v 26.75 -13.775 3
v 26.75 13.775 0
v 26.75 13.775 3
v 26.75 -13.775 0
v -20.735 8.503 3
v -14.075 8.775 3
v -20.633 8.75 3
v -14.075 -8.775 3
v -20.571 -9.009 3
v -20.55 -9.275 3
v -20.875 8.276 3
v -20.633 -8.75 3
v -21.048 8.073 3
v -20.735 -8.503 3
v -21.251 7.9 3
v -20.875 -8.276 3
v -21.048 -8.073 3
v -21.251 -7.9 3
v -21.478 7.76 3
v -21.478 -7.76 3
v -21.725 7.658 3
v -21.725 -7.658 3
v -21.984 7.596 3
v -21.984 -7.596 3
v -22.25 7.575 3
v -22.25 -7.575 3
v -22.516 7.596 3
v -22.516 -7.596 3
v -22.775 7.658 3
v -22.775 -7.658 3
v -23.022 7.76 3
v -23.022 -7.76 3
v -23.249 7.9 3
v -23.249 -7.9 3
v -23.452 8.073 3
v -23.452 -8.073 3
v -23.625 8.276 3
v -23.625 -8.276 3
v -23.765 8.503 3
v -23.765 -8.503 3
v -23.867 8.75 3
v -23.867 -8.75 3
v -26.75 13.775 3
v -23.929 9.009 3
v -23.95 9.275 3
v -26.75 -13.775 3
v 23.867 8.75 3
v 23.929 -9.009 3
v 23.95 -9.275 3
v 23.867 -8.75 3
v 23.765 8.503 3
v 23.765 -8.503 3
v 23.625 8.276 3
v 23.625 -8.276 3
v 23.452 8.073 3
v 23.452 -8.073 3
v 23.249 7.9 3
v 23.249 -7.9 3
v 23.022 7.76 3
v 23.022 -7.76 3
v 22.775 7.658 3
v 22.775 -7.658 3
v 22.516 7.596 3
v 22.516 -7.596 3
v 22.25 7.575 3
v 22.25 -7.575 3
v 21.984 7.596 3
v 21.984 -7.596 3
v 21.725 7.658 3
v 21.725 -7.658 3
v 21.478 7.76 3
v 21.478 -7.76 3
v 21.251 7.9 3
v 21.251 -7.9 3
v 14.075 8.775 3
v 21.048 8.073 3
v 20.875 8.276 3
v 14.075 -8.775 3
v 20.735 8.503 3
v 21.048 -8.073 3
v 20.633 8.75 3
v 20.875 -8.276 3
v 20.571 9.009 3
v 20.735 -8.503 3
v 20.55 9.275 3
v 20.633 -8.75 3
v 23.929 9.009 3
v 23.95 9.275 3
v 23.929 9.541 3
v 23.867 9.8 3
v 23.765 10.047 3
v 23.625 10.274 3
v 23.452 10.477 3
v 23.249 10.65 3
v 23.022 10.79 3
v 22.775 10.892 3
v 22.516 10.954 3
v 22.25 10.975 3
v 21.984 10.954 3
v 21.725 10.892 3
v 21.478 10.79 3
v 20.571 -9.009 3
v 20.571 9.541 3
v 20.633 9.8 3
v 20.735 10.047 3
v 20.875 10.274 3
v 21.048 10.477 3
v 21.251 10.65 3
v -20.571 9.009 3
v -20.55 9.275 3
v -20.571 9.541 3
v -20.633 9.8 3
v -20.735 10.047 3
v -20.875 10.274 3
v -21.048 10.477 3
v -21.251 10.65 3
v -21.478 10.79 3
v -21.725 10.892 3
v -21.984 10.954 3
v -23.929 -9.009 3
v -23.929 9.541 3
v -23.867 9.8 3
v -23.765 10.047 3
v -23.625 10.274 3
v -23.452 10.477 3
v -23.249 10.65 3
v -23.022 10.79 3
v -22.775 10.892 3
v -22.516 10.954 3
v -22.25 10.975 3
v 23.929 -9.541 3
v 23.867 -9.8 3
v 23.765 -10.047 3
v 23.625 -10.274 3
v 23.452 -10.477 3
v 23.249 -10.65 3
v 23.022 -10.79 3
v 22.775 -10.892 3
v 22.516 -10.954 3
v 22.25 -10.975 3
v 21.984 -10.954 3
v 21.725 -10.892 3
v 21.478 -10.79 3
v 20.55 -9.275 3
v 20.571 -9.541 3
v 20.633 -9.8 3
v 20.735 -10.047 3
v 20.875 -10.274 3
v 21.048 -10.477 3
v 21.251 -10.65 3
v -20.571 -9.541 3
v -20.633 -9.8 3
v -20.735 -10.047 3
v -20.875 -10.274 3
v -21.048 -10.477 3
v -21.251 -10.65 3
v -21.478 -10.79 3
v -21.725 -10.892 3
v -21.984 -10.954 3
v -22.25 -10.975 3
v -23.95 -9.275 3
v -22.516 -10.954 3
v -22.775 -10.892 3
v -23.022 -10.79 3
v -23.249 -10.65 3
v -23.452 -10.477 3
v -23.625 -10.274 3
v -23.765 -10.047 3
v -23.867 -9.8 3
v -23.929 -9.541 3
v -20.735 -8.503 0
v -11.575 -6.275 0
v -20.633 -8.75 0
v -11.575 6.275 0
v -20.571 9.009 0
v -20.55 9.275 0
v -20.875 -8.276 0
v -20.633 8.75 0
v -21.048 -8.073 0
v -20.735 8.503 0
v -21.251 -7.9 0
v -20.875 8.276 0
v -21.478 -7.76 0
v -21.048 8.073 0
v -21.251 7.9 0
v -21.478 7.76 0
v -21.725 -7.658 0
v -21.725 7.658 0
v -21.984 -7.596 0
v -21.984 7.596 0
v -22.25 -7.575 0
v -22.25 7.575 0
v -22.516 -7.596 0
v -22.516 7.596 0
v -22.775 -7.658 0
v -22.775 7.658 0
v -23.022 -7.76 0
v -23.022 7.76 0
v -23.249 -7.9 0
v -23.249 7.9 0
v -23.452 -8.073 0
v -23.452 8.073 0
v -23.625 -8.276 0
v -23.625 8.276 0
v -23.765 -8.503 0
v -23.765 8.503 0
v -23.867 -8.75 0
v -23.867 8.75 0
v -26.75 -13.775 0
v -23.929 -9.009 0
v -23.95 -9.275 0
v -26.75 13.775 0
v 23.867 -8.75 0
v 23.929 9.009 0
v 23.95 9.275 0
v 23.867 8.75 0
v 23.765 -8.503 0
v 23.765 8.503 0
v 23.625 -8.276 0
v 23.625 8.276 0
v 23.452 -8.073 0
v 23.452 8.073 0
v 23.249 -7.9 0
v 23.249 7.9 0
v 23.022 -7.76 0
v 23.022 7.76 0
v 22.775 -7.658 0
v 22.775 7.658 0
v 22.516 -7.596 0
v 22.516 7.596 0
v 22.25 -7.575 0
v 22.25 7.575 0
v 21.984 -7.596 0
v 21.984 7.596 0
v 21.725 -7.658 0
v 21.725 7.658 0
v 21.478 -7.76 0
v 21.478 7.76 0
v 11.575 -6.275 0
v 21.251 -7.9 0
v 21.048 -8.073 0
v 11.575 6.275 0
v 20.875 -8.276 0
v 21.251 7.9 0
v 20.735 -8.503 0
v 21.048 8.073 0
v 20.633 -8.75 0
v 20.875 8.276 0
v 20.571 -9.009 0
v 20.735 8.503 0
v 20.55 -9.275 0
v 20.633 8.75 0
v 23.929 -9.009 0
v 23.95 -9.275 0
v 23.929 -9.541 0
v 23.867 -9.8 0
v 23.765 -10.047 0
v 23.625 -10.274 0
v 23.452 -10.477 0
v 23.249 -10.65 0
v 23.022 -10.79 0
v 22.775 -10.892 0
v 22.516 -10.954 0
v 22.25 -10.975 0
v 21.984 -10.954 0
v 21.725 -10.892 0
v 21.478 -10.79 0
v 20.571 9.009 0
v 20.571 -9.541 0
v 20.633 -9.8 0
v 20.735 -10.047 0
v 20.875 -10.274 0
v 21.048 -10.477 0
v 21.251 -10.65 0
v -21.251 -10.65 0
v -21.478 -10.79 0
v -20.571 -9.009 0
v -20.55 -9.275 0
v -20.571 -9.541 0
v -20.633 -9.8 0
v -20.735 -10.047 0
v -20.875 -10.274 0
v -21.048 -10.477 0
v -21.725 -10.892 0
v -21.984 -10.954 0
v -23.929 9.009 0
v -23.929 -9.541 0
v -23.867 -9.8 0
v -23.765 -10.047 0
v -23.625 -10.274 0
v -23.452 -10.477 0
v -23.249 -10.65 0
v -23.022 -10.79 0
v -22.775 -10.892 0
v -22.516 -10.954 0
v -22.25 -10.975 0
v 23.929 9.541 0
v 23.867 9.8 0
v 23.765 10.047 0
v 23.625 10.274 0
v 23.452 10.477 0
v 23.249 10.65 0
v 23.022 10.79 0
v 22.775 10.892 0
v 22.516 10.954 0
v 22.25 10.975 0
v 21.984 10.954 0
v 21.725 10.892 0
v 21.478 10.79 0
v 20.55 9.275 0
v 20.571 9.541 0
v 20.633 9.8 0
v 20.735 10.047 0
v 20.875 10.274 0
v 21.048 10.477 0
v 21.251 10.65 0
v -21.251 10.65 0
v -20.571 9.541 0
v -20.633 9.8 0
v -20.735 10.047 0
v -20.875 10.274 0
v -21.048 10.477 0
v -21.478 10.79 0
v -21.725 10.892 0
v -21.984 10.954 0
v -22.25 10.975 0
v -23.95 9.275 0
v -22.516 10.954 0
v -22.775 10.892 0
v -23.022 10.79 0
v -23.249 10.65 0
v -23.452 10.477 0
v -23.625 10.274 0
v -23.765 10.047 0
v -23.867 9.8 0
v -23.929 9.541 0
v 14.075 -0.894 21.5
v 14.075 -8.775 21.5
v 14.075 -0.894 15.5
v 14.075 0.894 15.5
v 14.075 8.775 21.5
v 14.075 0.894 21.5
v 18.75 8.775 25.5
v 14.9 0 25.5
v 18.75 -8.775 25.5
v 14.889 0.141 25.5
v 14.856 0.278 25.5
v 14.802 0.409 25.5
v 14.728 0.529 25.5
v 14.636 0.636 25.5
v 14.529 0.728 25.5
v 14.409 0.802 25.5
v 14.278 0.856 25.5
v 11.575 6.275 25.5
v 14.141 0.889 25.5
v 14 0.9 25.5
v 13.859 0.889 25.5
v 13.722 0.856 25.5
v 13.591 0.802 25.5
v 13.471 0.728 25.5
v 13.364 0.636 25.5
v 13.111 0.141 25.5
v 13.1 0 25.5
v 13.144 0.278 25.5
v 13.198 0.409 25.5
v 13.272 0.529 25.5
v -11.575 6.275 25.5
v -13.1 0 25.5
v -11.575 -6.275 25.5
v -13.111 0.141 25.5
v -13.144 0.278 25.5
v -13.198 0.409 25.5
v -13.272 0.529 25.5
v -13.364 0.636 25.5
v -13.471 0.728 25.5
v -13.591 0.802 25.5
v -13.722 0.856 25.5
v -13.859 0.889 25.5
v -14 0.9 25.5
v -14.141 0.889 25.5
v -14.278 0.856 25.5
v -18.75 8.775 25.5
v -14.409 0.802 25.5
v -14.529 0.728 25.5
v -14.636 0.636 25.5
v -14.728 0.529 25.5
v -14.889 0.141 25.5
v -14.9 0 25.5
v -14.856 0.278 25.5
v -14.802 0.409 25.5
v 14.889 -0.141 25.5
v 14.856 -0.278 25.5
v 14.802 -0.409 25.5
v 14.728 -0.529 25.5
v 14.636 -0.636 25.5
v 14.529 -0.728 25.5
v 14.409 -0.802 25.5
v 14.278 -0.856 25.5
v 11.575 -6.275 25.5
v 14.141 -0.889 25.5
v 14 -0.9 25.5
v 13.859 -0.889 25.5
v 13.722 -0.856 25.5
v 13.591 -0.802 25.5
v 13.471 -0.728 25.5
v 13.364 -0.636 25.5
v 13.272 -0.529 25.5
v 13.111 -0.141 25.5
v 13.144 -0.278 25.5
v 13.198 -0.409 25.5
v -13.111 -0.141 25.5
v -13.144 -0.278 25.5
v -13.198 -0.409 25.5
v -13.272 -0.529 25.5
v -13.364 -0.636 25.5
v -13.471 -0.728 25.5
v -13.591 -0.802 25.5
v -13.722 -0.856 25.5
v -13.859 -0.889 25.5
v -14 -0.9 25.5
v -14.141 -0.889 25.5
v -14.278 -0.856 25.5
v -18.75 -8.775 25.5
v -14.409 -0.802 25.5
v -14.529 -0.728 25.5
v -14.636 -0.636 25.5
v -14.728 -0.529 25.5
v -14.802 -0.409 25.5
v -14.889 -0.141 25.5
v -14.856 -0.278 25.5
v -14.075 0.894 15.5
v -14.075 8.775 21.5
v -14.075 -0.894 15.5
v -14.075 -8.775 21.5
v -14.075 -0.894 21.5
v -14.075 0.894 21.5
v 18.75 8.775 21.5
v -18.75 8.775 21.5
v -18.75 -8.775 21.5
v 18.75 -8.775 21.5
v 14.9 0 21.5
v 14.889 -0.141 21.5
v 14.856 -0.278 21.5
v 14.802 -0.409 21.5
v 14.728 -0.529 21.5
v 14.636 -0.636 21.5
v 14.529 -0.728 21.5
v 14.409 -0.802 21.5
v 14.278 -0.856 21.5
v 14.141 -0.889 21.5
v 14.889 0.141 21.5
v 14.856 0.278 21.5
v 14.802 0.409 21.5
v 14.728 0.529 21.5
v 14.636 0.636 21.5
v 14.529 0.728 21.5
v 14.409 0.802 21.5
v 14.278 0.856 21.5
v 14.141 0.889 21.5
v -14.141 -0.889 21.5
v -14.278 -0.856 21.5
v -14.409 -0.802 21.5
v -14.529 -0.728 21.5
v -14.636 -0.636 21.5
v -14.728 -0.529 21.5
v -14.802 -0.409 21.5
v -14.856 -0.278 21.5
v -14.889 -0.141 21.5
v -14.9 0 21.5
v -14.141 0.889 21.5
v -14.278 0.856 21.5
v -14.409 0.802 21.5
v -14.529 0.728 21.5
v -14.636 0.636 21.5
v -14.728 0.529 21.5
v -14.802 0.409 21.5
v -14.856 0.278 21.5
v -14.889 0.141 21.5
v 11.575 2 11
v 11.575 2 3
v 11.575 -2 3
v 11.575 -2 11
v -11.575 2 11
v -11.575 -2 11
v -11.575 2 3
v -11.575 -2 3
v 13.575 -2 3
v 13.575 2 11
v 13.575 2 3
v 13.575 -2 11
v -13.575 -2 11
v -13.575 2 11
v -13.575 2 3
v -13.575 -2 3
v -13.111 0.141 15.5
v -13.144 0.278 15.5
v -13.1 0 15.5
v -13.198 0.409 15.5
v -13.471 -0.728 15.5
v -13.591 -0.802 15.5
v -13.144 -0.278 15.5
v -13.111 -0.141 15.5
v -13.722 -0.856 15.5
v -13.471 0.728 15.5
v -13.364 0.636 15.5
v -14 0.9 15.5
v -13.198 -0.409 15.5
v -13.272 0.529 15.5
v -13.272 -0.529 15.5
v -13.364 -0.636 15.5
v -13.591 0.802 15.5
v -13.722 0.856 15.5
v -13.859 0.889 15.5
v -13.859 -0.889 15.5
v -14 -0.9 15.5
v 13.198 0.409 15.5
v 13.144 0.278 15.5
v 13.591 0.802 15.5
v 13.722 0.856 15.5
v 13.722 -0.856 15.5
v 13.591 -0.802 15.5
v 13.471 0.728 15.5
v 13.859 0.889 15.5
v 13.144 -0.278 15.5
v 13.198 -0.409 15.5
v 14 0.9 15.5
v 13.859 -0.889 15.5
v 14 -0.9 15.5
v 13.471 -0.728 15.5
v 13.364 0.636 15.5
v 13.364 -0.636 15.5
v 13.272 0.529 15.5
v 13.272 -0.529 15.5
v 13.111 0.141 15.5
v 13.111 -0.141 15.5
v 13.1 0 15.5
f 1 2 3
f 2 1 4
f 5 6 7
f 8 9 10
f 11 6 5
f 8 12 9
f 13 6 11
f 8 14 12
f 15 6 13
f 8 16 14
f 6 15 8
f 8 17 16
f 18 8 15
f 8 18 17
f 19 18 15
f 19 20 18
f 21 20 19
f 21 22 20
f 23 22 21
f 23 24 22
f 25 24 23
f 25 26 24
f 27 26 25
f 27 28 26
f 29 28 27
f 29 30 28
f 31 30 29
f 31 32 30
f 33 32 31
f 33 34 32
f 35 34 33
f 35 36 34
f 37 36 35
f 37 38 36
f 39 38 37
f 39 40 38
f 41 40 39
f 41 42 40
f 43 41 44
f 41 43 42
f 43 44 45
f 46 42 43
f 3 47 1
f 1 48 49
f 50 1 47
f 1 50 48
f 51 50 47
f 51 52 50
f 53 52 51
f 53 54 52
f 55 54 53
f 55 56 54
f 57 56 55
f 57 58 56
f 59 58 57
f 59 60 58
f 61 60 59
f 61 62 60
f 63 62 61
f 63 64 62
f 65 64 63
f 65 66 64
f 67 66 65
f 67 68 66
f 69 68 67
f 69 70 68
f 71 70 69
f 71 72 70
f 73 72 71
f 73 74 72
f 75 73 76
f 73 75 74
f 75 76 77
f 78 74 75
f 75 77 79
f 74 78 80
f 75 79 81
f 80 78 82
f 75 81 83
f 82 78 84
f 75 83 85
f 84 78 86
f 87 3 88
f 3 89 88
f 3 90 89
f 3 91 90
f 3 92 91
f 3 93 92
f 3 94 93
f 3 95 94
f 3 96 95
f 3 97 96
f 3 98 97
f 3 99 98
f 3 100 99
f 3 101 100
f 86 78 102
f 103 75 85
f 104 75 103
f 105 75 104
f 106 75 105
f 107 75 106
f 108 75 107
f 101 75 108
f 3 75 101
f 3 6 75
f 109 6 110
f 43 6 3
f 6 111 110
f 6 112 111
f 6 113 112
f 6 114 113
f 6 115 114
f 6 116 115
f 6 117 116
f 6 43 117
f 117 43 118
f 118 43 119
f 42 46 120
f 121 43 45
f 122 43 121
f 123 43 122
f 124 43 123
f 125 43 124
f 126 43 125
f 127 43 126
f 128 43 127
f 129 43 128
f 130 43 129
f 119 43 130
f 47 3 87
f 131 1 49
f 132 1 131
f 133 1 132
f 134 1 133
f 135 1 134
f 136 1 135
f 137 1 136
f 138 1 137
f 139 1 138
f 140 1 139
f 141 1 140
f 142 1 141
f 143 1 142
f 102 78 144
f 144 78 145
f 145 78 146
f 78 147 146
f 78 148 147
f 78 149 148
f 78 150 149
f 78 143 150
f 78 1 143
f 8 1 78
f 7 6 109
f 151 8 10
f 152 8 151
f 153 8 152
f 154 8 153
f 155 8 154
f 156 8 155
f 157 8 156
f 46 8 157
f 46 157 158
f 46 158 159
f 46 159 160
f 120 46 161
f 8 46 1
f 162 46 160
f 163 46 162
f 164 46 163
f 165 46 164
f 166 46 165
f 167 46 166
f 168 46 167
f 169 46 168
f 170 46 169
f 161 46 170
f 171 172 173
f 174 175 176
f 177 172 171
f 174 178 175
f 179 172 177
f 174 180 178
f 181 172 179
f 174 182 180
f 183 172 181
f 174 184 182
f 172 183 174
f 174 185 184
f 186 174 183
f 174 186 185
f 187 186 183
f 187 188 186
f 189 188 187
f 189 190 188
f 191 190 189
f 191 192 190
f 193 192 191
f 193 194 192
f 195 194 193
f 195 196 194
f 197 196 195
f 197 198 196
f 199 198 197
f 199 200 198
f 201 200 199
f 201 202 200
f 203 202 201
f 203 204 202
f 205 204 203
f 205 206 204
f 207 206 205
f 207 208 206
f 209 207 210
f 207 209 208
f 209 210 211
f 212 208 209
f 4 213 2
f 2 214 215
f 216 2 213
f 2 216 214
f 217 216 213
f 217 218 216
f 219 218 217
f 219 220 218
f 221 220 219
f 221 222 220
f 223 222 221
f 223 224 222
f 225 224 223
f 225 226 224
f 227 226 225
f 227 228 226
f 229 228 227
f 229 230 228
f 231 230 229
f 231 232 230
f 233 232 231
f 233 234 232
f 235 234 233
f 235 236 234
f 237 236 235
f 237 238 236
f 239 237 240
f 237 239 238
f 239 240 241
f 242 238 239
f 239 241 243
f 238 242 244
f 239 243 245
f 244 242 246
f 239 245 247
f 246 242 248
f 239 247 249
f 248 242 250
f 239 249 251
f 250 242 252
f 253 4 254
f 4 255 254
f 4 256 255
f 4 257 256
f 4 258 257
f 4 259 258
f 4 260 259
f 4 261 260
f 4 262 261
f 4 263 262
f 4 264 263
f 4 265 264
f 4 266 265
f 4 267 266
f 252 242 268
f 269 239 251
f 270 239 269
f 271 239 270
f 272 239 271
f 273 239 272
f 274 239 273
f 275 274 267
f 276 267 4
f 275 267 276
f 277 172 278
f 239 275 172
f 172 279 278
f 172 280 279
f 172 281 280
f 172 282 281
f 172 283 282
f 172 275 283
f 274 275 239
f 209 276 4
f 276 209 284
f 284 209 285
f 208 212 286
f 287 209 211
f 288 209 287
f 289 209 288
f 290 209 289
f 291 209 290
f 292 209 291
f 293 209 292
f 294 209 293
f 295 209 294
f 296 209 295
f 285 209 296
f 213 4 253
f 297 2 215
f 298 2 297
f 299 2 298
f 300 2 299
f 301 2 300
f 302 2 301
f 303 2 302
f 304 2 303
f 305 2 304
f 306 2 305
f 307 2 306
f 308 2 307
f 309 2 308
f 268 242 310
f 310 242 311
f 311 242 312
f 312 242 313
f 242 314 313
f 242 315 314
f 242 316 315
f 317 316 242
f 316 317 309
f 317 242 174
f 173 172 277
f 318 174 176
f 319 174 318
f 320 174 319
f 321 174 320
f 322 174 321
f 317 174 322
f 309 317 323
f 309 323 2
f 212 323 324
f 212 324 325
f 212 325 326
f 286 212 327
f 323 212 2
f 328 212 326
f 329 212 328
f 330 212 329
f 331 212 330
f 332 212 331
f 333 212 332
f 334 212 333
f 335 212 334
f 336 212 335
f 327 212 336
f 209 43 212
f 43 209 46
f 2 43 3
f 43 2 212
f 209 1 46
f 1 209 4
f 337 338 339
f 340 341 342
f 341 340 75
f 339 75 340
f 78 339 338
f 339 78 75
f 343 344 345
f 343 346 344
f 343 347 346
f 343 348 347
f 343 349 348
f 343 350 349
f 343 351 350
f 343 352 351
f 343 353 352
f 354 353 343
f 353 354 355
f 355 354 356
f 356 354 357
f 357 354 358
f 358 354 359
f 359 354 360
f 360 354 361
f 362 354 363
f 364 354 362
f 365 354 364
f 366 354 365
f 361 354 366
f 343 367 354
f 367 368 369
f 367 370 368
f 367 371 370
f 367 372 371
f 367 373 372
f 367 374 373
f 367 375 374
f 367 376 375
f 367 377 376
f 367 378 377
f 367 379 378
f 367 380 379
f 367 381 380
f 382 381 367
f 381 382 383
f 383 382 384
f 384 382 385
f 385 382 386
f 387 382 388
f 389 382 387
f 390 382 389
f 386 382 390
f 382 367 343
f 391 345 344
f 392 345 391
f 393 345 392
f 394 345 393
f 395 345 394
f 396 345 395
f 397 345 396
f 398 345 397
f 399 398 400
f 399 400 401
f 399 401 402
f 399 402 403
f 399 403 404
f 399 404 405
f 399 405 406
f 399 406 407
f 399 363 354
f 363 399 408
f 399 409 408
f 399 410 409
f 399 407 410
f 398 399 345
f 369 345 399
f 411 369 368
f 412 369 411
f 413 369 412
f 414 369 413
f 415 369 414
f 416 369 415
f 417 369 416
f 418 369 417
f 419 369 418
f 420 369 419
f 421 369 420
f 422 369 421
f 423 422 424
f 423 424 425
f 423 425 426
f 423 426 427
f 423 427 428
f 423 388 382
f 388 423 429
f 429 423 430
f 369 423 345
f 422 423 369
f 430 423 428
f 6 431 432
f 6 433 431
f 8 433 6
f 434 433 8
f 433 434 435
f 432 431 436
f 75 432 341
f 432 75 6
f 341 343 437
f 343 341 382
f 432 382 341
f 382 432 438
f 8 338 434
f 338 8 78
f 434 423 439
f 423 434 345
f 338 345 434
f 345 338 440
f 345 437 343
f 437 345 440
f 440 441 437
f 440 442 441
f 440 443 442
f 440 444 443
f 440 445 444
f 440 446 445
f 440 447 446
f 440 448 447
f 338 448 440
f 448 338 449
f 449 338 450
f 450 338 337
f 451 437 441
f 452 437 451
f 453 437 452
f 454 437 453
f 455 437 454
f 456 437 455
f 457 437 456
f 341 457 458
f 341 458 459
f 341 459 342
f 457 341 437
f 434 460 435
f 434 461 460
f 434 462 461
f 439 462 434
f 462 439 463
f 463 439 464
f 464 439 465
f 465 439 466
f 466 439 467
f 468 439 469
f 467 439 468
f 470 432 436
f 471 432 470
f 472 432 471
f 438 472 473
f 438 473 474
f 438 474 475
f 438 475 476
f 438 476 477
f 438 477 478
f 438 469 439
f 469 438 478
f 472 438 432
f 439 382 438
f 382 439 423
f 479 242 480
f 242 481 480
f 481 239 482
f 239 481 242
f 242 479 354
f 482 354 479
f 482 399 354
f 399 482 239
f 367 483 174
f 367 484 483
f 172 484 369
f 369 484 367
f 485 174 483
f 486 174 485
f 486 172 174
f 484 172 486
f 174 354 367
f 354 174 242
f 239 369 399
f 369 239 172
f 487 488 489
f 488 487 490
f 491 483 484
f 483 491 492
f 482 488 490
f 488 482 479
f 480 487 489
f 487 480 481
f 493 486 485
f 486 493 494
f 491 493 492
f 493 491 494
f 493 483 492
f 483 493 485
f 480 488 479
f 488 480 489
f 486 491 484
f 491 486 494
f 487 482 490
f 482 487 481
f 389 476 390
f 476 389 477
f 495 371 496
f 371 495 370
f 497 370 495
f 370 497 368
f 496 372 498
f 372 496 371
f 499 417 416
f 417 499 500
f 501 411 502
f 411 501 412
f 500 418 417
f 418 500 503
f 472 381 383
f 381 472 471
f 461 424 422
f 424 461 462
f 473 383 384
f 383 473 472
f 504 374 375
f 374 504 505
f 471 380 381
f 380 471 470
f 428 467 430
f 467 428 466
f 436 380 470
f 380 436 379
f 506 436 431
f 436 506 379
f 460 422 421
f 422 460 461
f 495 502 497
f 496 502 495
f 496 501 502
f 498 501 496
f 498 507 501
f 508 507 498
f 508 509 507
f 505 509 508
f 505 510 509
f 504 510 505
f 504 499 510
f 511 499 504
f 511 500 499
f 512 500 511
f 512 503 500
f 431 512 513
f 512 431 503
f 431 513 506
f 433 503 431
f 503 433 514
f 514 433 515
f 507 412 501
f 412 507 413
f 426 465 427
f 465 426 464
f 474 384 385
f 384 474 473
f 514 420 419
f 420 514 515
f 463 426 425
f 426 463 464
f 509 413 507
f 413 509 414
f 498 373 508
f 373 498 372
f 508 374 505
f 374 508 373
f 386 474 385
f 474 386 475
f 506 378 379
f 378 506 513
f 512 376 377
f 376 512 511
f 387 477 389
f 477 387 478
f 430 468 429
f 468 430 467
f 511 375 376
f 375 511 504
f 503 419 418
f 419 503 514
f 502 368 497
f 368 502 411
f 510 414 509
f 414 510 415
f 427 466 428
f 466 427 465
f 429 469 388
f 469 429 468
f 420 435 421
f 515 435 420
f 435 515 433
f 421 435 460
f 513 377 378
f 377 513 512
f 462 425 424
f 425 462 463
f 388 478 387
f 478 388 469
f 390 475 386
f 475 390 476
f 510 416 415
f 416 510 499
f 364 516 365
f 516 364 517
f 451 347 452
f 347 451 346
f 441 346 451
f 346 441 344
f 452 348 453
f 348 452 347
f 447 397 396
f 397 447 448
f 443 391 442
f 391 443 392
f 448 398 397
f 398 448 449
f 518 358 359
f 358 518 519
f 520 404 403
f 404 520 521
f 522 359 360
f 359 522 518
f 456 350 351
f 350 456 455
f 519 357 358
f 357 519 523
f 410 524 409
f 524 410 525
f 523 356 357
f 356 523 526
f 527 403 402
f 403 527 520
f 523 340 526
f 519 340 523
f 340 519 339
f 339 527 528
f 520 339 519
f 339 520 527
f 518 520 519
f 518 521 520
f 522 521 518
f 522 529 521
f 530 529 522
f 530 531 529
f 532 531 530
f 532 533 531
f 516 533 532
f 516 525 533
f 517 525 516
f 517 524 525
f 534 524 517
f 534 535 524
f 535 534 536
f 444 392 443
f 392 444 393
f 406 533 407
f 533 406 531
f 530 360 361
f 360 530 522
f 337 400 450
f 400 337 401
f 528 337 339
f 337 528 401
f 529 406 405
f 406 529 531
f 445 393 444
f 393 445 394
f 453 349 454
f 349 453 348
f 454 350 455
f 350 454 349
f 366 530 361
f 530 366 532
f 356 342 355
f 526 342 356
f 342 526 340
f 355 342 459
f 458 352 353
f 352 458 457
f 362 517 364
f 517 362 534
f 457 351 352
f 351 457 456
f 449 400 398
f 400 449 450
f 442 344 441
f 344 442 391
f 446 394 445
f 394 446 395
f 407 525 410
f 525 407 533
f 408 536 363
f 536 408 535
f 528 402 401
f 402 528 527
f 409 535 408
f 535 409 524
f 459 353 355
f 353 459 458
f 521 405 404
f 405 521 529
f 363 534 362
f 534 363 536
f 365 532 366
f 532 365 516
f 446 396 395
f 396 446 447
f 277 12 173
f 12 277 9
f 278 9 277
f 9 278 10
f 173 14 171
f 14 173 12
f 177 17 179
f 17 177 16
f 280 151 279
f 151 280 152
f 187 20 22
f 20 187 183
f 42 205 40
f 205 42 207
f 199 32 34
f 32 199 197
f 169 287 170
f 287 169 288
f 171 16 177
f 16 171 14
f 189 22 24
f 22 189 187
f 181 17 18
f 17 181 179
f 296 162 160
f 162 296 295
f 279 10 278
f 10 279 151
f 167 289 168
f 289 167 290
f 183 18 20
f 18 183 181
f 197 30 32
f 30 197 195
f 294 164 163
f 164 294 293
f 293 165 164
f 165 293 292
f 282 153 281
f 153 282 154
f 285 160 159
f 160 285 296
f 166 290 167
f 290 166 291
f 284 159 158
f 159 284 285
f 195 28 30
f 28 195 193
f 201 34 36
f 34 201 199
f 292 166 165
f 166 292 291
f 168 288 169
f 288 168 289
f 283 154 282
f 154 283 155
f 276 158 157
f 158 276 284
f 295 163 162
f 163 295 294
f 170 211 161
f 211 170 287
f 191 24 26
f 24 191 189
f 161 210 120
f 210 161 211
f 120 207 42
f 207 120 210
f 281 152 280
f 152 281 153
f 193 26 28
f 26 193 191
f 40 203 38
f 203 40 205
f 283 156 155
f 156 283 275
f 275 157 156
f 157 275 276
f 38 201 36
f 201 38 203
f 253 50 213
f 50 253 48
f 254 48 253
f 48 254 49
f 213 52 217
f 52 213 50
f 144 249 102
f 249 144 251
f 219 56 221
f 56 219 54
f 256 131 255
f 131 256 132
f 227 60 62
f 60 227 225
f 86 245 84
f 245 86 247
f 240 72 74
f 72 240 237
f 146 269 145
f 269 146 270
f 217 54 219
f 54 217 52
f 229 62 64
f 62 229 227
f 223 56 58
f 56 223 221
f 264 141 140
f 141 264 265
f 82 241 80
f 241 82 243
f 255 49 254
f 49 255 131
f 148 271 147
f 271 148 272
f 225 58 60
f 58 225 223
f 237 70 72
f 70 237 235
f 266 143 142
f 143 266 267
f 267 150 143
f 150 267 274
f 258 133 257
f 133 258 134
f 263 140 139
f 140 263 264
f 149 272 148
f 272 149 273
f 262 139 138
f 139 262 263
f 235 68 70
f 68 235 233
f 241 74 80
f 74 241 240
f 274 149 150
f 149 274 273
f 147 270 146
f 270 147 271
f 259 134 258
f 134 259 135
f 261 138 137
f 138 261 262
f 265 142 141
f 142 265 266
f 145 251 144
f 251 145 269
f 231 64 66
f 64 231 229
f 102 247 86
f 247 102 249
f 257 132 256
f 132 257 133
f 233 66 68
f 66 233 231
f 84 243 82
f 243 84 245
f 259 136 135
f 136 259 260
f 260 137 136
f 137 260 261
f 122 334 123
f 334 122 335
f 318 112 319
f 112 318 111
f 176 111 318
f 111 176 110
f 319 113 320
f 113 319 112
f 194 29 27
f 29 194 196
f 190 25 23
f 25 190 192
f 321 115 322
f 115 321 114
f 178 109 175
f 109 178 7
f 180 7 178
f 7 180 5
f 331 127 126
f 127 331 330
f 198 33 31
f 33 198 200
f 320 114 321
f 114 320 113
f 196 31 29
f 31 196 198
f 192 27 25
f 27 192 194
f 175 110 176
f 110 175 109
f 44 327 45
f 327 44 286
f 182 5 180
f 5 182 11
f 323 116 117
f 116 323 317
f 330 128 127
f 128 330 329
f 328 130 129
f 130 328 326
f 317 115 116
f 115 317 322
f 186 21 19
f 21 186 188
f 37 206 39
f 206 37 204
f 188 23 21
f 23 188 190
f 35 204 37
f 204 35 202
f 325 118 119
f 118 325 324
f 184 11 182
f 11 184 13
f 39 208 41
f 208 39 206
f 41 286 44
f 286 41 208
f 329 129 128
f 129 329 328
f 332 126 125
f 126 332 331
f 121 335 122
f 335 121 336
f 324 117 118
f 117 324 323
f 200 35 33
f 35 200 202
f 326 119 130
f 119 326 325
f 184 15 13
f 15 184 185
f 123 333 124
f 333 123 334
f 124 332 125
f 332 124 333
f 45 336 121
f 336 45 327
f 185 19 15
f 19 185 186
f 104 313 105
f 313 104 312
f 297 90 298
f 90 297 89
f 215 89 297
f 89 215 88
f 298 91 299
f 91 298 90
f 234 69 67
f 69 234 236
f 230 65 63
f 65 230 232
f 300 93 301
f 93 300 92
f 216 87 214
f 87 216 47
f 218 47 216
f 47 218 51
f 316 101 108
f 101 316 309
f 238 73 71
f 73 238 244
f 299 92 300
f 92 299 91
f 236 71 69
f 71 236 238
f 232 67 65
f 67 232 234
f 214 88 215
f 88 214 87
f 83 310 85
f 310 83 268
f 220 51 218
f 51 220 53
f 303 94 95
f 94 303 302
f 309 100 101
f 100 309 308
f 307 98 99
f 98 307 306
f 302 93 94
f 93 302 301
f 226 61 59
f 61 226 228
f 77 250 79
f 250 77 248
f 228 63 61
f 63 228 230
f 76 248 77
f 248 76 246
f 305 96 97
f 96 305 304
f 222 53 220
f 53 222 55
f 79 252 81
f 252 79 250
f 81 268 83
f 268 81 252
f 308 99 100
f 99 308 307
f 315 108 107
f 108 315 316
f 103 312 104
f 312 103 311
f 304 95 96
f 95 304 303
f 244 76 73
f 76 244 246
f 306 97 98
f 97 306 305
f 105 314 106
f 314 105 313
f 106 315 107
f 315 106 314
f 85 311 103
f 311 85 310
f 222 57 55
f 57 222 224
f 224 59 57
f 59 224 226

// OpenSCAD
// file: params.scad
// params.scad — Parametros globales para el montaje de actuadores MASK-7
// Compatible con OpenSCAD 2021+

$fn = 40; // Calidad de curvas circulares

// --- Tolerancia general para impresion FDM ---
tol = 0.35; // Holgura lateral para ajuste deslizante firme

// --- Micro-servo standard tipo MG90S / SG90 ---
servo_length = 22.8 + tol;       // Largo del cuerpo principal (mm)
servo_width  = 12.2 + tol;       // Ancho del cuerpo principal (mm)
servo_height = 22.5;             // Altura del cuerpo hasta las orejas de montaje (mm)
servo_total_height = 28.5;       // Altura total incluyendo cabezal del eje (mm)

servo_flange_length = 32.5;      // Largo total con orejas de fijacion (mm)
servo_flange_thickness = 2.5;    // Espesor de las orejas del servo (mm)
servo_hole_dist = 28.0;          // Distancia entre centros de tornillos de fijacion (mm)

// --- Tornilleria ---
screw_m2_dia = 2.0;              // Diametro nominal tornillo M2 (mm)
screw_m2_hole = 2.4;             // Agujero de paso M2 con holgura (mm)
screw_m2_tap  = 1.8;             // Agujero para autorroscar M2 en plastico (mm)

screw_m3_dia = 3.0;              // Diametro nominal tornillo M3 (mm)
screw_m3_hole = 3.4;             // Agujero de paso M3 con holgura (mm)
screw_m3_tap  = 2.8;             // Agujero autorroscante M3 (mm)

// --- Espesores estructurales de soportes ---
wall_thickness = 2.5;            // Espesor de pared minima para rigidez (mm)
base_thickness = 3.0;            // Espesor de la placa base atornillable (mm)

// --- Solenoide mini 5V (tipo JF-0530B) ---
solenoid_length = 30.0 + tol;    // Largo del cuerpo del solenoide (mm)
solenoid_width  = 13.0 + tol;    // Ancho del cuerpo del solenoide (mm)
solenoid_height = 15.0 + tol;    // Altura del cuerpo del solenoide (mm)
solenoid_hole_dist = 16.0;       // Distancia entre agujeros roscados M3 de fijacion (mm)

// --- Campana resonadora ---
bell_diameter = 40.0;            // Diametro de campana o cuenco (mm)
bell_height   = 20.0;            // Altura de campana (mm)
// main file
// jaw_mount.scad — Soporte para el servo de mandibula de la mascara Hannya
//
// =============================================================================
// MEDIDAS A VERIFICAR EN LA MASCARA REAL ANTES DE IMPRIMIR:
// 1. Distancia desde el eje de giro de la mandibula hasta el anclaje del eslabon
//    (determina el brazo de palanca mecanico y el recorrido angular necesario).
// 2. Curvatura y grosor de la resina interior del menton/mejilla donde asienta la base.
// 3. Espacio libre vertical (Z) para evitar que la bocina/horn del servo roce
//    con la cara del usuario o la pared interior de la mascara.
// 4. Diametro de los tornillos de fijacion a la mascara (M2.5 o M3 segun insertos).
// =============================================================================

include <params.scad>

module jaw_mount() {
    box_outer_l = servo_length + (wall_thickness * 2);
    box_outer_w = servo_width + (wall_thickness * 2);
    box_outer_h = servo_height;

    flange_ext_l = servo_flange_length + (wall_thickness * 2);
    base_l = flange_ext_l + 16.0; // Orejas adicionales para fijar a la mascara
    base_w = box_outer_w + 10.0;

    difference() {
        union() {
            // Placa base de fijacion a la mascara
            translate([-base_l / 2, -base_w / 2, 0])
                cube([base_l, base_w, base_thickness]);

            // Cuerpo del alojamiento del servo
            translate([-box_outer_l / 2, -box_outer_w / 2, base_thickness])
                cube([box_outer_l, box_outer_w, box_outer_h]);

            // Salientes superiores para atornillar las orejas del servo
            translate([-servo_flange_length / 2 - wall_thickness, -box_outer_w / 2, base_thickness + box_outer_h - 4.0])
                cube([servo_flange_length + (wall_thickness * 2), box_outer_w, 4.0]);
        }

        // Cavidad pasante para el cuerpo del servo
        translate([-servo_length / 2, -servo_width / 2, -1])
            cube([servo_length, servo_width, box_outer_h + base_thickness + 2]);

        // Ranura para paso de cable lateral del servo
        translate([-servo_length / 2 - 2, -4.0 / 2, base_thickness])
            cube([servo_length + 4, 4.0, 8.0]);

        // Agujeros para atornillar el servo a las orejas (M2 autorroscante)
        translate([-servo_hole_dist / 2, 0, base_thickness + box_outer_h - 10])
            cylinder(d = screw_m2_tap, h = 15);
        translate([servo_hole_dist / 2, 0, base_thickness + box_outer_h - 10])
            cylinder(d = screw_m2_tap, h = 15);

        // Agujeros de montaje de la base hacia la mascara (4 esquinas M3)
        translate([-base_l / 2 + 4.5, -base_w / 2 + 4.5, -1])
            cylinder(d = screw_m3_hole, h = base_thickness + 2);
        translate([base_l / 2 - 4.5, -base_w / 2 + 4.5, -1])
            cylinder(d = screw_m3_hole, h = base_thickness + 2);
        translate([-base_l / 2 + 4.5, base_w / 2 - 4.5, -1])
            cylinder(d = screw_m3_hole, h = base_thickness + 2);
        translate([base_l / 2 - 4.5, base_w / 2 - 4.5, -1])
            cylinder(d = screw_m3_hole, h = base_thickness + 2);
    }
}

// Renderizado directo
jaw_mount();
